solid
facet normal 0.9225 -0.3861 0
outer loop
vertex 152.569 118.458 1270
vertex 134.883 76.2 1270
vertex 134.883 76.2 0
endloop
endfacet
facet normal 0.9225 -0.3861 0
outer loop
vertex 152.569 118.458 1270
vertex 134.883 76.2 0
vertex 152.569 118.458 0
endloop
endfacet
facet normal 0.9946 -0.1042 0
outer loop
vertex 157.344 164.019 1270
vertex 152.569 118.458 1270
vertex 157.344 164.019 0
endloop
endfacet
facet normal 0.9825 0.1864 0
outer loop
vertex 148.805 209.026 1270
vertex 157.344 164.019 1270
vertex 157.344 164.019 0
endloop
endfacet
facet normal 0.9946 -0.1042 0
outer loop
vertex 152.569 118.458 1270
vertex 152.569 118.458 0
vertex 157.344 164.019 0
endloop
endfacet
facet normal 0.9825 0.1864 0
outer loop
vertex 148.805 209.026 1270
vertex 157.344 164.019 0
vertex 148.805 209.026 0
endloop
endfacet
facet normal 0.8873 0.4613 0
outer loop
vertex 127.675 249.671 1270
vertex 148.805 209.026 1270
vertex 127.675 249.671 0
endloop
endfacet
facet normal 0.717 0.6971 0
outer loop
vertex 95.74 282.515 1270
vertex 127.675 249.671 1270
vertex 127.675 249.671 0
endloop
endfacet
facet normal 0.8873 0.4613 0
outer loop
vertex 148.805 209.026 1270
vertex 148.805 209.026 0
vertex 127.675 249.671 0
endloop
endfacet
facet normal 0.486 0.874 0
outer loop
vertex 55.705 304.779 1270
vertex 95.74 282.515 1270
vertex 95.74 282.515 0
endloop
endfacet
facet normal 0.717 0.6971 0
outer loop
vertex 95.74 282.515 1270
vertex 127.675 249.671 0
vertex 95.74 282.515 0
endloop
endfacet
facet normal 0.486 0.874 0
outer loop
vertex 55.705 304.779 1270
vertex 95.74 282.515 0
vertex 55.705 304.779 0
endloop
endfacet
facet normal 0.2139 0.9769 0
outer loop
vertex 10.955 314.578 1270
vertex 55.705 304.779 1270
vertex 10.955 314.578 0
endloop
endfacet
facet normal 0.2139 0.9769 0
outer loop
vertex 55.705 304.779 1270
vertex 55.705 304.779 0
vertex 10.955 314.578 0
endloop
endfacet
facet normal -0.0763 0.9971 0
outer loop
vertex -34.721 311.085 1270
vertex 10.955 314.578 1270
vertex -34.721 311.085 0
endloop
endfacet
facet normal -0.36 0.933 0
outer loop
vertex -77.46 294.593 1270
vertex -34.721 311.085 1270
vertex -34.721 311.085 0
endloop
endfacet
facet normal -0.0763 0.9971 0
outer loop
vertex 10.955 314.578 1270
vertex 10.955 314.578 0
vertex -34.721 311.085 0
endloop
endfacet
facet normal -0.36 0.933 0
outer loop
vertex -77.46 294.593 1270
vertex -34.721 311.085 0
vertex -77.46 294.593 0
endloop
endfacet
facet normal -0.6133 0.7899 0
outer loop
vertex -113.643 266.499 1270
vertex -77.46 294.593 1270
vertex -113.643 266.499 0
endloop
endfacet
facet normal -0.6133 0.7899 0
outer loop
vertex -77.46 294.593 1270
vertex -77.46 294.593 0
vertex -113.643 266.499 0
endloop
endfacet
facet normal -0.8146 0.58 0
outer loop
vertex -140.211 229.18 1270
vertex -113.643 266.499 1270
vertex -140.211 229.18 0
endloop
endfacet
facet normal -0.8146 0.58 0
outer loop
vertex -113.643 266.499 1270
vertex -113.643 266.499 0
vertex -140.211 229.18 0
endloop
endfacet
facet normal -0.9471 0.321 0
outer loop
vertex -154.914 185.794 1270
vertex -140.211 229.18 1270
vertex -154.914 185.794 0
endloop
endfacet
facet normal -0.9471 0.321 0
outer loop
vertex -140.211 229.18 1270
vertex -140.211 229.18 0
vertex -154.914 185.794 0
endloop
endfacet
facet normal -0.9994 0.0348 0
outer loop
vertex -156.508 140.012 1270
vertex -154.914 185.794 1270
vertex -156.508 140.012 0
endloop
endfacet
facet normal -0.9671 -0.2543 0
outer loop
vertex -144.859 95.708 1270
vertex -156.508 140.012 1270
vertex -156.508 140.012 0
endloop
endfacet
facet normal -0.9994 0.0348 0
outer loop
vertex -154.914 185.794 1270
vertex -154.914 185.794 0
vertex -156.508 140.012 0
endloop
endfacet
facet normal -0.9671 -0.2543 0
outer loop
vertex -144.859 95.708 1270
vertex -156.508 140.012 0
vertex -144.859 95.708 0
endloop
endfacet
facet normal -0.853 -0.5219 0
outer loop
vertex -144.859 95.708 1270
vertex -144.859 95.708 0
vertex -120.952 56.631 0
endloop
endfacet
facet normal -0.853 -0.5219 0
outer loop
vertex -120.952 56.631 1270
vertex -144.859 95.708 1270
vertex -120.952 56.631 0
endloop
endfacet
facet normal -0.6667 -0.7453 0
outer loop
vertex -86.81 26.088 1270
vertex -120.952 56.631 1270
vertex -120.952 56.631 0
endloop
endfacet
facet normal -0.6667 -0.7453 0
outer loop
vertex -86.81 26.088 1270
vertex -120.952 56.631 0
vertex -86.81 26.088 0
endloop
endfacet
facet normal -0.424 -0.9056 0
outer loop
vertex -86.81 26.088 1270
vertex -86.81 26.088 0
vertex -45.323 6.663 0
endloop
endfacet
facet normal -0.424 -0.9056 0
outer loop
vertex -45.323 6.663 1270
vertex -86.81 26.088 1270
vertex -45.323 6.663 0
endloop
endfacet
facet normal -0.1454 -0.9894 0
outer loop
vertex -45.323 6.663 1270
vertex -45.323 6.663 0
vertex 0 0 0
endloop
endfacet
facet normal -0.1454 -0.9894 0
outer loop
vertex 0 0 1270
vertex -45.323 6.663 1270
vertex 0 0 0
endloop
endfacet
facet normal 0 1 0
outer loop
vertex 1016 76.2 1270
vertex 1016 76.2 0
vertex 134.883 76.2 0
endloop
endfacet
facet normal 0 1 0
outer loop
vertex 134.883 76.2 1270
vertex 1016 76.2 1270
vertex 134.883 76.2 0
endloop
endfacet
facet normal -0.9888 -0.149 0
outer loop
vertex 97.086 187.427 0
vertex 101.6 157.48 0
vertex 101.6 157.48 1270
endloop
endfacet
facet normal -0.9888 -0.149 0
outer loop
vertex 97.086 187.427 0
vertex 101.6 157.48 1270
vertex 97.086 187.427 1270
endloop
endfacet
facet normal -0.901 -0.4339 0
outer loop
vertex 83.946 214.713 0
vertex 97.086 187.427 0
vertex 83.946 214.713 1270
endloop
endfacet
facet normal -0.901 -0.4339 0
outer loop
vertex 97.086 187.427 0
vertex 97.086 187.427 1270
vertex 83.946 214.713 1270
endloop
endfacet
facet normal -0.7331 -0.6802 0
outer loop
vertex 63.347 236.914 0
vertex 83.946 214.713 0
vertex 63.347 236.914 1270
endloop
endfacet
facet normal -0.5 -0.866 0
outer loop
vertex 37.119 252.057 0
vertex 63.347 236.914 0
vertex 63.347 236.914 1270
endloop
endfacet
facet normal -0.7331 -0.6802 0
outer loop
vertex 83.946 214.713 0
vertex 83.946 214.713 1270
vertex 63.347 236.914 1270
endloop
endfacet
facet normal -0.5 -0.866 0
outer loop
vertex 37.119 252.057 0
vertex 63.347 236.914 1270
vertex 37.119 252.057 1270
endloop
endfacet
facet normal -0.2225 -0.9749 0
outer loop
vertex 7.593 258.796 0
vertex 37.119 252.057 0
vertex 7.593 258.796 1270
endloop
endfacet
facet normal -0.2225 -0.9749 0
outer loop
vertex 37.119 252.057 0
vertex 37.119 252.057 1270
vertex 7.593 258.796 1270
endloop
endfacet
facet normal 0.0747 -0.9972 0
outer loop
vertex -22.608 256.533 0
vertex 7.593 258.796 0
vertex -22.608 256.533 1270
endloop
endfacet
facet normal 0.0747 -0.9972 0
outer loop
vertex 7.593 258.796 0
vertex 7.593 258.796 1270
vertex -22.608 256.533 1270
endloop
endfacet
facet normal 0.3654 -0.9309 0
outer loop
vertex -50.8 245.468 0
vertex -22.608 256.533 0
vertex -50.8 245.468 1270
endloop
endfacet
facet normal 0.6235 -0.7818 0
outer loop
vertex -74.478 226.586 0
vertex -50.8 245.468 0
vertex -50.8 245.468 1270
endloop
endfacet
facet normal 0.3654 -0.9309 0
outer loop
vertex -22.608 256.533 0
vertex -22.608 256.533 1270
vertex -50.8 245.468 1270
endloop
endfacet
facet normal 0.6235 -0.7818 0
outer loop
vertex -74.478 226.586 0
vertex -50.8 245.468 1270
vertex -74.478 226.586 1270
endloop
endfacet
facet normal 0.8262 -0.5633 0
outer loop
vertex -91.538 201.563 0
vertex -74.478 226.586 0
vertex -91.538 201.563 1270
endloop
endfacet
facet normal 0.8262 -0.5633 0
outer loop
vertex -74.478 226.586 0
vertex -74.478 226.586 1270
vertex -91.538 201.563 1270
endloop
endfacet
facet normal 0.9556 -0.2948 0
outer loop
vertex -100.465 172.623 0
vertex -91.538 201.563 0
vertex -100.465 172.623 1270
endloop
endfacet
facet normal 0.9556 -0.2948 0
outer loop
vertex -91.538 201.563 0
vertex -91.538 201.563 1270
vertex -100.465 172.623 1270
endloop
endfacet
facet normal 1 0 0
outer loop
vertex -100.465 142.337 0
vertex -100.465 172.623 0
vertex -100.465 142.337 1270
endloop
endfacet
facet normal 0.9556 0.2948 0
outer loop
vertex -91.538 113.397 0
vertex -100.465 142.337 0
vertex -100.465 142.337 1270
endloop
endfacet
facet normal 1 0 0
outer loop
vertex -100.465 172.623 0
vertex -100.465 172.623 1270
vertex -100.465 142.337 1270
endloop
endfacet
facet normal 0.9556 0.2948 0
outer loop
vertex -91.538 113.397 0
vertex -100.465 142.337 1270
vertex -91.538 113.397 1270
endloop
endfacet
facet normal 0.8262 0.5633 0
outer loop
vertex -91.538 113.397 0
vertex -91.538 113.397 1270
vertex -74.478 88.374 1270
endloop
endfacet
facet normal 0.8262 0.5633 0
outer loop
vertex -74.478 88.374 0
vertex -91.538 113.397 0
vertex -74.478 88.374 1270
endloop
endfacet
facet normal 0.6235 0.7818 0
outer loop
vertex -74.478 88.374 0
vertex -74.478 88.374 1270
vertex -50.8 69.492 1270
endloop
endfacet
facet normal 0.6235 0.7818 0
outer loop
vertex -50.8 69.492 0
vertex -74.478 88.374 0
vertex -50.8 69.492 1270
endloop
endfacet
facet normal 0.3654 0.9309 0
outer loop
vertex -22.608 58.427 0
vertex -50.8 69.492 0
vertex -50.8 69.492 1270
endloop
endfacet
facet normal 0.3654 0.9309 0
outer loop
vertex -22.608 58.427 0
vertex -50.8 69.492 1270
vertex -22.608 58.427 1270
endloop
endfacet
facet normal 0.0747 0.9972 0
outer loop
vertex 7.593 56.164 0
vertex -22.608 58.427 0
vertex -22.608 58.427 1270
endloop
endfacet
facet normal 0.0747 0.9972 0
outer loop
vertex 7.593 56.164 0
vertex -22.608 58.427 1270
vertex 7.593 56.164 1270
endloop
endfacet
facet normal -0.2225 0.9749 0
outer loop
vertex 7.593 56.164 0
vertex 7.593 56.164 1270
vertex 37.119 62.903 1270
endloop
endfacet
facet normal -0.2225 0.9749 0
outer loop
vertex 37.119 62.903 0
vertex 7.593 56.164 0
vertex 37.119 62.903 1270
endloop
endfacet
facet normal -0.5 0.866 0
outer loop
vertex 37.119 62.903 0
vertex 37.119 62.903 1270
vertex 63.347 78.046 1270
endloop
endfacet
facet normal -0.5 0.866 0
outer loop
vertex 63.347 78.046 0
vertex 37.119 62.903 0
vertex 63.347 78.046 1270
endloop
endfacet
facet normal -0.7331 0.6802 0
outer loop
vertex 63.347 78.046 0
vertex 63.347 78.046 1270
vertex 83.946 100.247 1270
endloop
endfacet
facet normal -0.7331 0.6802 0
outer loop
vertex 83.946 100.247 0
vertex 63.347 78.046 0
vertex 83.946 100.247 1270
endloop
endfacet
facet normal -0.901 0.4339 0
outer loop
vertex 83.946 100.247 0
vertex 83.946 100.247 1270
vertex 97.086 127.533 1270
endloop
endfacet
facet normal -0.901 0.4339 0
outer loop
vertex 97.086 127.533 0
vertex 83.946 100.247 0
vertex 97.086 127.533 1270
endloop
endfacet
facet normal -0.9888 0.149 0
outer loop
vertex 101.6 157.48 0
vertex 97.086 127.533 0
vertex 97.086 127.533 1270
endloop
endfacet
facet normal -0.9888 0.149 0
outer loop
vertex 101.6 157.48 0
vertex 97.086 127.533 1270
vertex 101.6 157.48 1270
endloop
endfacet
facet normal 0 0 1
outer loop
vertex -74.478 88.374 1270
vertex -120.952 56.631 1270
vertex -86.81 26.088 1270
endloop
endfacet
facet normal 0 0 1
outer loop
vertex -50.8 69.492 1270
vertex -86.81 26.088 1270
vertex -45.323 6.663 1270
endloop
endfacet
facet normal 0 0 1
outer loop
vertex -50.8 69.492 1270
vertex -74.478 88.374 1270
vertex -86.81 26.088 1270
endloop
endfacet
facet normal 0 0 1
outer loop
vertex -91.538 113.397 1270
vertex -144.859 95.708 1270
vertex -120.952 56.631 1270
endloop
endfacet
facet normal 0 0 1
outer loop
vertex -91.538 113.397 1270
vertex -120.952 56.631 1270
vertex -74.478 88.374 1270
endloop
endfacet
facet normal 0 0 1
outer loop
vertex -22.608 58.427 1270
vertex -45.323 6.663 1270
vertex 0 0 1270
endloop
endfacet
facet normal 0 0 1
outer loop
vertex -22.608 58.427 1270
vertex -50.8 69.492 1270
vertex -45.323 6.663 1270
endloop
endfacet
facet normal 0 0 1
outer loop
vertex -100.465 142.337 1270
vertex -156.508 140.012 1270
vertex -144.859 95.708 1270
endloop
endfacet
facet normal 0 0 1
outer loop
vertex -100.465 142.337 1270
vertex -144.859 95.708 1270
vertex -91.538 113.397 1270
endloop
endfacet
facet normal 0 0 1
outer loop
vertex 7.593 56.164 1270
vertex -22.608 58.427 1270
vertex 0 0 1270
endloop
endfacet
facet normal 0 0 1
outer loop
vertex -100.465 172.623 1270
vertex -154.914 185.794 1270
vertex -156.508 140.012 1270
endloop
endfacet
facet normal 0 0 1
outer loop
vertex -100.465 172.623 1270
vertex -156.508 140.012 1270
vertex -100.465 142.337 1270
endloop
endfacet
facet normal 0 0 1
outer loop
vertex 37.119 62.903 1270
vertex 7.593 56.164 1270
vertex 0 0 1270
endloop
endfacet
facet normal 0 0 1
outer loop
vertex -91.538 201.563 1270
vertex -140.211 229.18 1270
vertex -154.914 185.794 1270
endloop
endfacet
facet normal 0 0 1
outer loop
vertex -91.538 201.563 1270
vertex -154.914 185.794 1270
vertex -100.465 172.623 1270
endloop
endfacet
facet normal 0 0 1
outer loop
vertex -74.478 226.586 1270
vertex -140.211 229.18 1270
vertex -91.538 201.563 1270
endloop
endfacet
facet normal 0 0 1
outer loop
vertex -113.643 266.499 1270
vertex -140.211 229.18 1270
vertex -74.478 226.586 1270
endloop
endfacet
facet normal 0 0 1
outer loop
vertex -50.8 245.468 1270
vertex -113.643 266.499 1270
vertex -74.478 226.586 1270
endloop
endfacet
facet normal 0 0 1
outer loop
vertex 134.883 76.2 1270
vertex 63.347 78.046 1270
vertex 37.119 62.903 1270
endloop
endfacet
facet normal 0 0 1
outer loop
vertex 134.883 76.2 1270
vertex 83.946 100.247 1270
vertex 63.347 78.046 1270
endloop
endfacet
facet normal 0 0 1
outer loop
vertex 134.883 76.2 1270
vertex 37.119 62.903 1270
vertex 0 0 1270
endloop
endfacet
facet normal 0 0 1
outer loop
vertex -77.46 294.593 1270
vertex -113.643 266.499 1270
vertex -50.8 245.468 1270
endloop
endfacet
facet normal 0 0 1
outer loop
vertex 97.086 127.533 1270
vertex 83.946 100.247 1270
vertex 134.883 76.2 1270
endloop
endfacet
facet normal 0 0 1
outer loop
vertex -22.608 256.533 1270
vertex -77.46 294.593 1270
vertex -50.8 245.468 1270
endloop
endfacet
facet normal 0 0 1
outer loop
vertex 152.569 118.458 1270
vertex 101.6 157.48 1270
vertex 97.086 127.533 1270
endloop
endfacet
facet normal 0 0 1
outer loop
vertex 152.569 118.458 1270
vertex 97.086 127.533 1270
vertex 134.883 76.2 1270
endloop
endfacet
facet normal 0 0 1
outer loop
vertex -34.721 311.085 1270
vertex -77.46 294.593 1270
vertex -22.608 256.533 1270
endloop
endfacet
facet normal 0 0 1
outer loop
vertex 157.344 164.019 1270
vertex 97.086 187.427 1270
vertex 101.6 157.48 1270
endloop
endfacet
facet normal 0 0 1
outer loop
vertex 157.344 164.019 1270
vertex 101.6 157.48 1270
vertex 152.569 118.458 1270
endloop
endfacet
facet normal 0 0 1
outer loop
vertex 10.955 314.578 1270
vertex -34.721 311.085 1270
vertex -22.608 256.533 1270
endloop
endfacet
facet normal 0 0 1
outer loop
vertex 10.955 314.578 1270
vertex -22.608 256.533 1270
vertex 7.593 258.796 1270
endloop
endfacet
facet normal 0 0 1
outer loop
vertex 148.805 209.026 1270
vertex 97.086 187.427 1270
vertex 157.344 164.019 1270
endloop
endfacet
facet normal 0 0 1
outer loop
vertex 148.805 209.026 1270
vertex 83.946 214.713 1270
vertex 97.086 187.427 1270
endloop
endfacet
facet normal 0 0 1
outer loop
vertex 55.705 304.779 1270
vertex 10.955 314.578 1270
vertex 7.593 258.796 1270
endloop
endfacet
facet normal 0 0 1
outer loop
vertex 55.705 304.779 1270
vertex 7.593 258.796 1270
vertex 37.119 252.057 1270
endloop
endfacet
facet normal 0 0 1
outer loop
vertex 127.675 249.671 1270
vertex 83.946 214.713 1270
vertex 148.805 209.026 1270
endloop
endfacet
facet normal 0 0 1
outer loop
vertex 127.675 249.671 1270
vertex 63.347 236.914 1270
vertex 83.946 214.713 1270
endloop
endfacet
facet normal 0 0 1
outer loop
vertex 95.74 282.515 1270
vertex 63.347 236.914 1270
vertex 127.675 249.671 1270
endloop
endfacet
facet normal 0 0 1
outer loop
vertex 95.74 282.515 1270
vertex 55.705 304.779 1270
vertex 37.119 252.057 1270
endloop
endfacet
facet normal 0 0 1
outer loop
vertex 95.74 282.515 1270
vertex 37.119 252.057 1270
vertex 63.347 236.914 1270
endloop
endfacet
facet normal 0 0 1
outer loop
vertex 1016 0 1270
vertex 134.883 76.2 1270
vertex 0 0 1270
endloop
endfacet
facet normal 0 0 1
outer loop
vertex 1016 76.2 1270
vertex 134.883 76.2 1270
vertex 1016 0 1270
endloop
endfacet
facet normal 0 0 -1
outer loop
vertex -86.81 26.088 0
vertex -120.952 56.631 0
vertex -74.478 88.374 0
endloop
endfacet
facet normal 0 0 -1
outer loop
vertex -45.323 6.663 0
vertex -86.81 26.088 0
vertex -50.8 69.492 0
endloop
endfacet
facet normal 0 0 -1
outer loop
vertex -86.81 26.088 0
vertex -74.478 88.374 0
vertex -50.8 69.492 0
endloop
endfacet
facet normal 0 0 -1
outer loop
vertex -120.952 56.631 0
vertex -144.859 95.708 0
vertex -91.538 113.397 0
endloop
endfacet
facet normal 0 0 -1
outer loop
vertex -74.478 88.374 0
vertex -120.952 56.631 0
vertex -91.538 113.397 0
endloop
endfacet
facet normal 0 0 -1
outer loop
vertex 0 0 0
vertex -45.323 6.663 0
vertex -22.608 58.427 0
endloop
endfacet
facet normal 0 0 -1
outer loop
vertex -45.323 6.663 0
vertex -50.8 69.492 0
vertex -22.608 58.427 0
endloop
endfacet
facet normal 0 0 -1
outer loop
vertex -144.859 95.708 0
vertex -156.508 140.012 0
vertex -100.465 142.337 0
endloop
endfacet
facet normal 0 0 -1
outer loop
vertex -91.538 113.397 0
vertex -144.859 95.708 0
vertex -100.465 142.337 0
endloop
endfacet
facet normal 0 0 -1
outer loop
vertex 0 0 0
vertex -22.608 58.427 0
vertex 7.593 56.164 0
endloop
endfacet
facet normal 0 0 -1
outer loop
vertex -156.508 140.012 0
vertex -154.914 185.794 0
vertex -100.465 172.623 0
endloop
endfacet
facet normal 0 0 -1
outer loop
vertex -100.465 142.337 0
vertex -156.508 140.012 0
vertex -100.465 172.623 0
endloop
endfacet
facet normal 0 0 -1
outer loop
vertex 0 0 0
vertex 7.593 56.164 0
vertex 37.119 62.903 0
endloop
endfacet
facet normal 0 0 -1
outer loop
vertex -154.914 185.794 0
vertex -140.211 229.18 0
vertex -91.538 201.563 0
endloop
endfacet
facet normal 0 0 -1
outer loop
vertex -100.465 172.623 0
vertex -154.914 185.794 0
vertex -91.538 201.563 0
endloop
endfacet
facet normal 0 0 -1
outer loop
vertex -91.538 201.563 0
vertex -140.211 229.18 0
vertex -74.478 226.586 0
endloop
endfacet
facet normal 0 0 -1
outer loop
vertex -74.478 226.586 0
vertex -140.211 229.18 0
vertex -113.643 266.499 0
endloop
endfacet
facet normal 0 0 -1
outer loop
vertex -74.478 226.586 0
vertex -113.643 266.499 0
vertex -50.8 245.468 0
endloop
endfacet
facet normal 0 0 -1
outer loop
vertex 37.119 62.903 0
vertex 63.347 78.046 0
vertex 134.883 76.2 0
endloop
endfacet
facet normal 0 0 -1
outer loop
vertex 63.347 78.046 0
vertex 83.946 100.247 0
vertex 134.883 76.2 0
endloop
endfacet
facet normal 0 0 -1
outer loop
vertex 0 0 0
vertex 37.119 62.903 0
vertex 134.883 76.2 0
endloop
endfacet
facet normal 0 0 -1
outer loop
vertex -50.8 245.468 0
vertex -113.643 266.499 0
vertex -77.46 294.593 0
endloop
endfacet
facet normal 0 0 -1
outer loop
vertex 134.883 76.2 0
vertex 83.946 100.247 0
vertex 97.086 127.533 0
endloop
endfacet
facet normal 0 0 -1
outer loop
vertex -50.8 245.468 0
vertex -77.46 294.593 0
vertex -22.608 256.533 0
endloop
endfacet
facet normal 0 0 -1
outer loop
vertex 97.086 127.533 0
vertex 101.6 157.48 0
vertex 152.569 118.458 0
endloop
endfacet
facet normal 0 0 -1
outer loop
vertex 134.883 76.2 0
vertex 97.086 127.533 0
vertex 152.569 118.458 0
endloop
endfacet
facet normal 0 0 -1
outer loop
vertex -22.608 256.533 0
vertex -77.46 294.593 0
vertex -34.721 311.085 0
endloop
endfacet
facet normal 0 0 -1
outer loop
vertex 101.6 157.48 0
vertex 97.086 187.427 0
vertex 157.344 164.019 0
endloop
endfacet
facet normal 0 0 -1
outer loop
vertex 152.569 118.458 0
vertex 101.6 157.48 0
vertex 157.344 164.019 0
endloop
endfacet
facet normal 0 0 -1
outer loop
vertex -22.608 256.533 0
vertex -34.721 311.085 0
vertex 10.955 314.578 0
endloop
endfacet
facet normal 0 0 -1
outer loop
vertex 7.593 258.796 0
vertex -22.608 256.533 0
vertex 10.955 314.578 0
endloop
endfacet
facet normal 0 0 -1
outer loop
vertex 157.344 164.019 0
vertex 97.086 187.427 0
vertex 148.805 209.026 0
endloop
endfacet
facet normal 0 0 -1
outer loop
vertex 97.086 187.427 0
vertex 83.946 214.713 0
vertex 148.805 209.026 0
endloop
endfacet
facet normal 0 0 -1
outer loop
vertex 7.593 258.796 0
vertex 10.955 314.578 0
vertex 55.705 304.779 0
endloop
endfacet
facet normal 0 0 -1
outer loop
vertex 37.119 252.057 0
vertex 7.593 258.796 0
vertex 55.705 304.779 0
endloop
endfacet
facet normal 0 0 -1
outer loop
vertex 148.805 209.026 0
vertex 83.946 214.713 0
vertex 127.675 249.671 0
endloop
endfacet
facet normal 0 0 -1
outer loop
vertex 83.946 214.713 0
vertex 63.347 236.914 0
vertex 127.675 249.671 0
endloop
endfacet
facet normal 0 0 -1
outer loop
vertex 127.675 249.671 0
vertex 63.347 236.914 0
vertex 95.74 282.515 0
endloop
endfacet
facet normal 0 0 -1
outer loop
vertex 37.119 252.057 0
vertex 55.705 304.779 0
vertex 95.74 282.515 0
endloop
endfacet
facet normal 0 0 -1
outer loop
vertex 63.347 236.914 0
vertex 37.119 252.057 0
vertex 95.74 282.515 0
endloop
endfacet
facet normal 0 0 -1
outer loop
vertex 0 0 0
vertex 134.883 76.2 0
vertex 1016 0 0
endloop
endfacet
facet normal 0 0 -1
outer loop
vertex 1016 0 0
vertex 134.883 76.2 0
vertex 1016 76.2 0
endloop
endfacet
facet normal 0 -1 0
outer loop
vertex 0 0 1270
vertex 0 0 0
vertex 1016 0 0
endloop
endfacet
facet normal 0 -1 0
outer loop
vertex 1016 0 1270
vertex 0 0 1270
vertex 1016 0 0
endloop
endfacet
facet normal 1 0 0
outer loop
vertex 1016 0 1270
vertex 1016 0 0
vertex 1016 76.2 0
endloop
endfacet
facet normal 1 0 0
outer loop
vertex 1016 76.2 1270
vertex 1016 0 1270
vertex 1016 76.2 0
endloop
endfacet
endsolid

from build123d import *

# Parameters (mm, degrees)
F1_DEPTH = 1270
F2_R     = 101.6
F3_DEPTH = 1270.001


with BuildPart() as f1:
    # F0 (on Top) → F1 (new body)
    with BuildSketch(Plane.XY):
        with BuildLine():
            ThreePointArc((134.883327, 76.2), (-77.459589, 294.592955), (0, 0))
            Line((0, 0), (1016, 0))
            Line((1016, 0), (1016, 76.2))
            Line((1016, 76.2), (134.883327, 76.2))
        make_face()
    extrude(amount=F1_DEPTH)

    # F2 (on face) → F3 (cut, through all)
    with BuildSketch(Plane.XY.offset(1270)):
        with Locations((0, 157.48)):
            Circle(F2_R)
    extrude(amount=-F3_DEPTH, mode=Mode.SUBTRACT)


solid = f1.part
